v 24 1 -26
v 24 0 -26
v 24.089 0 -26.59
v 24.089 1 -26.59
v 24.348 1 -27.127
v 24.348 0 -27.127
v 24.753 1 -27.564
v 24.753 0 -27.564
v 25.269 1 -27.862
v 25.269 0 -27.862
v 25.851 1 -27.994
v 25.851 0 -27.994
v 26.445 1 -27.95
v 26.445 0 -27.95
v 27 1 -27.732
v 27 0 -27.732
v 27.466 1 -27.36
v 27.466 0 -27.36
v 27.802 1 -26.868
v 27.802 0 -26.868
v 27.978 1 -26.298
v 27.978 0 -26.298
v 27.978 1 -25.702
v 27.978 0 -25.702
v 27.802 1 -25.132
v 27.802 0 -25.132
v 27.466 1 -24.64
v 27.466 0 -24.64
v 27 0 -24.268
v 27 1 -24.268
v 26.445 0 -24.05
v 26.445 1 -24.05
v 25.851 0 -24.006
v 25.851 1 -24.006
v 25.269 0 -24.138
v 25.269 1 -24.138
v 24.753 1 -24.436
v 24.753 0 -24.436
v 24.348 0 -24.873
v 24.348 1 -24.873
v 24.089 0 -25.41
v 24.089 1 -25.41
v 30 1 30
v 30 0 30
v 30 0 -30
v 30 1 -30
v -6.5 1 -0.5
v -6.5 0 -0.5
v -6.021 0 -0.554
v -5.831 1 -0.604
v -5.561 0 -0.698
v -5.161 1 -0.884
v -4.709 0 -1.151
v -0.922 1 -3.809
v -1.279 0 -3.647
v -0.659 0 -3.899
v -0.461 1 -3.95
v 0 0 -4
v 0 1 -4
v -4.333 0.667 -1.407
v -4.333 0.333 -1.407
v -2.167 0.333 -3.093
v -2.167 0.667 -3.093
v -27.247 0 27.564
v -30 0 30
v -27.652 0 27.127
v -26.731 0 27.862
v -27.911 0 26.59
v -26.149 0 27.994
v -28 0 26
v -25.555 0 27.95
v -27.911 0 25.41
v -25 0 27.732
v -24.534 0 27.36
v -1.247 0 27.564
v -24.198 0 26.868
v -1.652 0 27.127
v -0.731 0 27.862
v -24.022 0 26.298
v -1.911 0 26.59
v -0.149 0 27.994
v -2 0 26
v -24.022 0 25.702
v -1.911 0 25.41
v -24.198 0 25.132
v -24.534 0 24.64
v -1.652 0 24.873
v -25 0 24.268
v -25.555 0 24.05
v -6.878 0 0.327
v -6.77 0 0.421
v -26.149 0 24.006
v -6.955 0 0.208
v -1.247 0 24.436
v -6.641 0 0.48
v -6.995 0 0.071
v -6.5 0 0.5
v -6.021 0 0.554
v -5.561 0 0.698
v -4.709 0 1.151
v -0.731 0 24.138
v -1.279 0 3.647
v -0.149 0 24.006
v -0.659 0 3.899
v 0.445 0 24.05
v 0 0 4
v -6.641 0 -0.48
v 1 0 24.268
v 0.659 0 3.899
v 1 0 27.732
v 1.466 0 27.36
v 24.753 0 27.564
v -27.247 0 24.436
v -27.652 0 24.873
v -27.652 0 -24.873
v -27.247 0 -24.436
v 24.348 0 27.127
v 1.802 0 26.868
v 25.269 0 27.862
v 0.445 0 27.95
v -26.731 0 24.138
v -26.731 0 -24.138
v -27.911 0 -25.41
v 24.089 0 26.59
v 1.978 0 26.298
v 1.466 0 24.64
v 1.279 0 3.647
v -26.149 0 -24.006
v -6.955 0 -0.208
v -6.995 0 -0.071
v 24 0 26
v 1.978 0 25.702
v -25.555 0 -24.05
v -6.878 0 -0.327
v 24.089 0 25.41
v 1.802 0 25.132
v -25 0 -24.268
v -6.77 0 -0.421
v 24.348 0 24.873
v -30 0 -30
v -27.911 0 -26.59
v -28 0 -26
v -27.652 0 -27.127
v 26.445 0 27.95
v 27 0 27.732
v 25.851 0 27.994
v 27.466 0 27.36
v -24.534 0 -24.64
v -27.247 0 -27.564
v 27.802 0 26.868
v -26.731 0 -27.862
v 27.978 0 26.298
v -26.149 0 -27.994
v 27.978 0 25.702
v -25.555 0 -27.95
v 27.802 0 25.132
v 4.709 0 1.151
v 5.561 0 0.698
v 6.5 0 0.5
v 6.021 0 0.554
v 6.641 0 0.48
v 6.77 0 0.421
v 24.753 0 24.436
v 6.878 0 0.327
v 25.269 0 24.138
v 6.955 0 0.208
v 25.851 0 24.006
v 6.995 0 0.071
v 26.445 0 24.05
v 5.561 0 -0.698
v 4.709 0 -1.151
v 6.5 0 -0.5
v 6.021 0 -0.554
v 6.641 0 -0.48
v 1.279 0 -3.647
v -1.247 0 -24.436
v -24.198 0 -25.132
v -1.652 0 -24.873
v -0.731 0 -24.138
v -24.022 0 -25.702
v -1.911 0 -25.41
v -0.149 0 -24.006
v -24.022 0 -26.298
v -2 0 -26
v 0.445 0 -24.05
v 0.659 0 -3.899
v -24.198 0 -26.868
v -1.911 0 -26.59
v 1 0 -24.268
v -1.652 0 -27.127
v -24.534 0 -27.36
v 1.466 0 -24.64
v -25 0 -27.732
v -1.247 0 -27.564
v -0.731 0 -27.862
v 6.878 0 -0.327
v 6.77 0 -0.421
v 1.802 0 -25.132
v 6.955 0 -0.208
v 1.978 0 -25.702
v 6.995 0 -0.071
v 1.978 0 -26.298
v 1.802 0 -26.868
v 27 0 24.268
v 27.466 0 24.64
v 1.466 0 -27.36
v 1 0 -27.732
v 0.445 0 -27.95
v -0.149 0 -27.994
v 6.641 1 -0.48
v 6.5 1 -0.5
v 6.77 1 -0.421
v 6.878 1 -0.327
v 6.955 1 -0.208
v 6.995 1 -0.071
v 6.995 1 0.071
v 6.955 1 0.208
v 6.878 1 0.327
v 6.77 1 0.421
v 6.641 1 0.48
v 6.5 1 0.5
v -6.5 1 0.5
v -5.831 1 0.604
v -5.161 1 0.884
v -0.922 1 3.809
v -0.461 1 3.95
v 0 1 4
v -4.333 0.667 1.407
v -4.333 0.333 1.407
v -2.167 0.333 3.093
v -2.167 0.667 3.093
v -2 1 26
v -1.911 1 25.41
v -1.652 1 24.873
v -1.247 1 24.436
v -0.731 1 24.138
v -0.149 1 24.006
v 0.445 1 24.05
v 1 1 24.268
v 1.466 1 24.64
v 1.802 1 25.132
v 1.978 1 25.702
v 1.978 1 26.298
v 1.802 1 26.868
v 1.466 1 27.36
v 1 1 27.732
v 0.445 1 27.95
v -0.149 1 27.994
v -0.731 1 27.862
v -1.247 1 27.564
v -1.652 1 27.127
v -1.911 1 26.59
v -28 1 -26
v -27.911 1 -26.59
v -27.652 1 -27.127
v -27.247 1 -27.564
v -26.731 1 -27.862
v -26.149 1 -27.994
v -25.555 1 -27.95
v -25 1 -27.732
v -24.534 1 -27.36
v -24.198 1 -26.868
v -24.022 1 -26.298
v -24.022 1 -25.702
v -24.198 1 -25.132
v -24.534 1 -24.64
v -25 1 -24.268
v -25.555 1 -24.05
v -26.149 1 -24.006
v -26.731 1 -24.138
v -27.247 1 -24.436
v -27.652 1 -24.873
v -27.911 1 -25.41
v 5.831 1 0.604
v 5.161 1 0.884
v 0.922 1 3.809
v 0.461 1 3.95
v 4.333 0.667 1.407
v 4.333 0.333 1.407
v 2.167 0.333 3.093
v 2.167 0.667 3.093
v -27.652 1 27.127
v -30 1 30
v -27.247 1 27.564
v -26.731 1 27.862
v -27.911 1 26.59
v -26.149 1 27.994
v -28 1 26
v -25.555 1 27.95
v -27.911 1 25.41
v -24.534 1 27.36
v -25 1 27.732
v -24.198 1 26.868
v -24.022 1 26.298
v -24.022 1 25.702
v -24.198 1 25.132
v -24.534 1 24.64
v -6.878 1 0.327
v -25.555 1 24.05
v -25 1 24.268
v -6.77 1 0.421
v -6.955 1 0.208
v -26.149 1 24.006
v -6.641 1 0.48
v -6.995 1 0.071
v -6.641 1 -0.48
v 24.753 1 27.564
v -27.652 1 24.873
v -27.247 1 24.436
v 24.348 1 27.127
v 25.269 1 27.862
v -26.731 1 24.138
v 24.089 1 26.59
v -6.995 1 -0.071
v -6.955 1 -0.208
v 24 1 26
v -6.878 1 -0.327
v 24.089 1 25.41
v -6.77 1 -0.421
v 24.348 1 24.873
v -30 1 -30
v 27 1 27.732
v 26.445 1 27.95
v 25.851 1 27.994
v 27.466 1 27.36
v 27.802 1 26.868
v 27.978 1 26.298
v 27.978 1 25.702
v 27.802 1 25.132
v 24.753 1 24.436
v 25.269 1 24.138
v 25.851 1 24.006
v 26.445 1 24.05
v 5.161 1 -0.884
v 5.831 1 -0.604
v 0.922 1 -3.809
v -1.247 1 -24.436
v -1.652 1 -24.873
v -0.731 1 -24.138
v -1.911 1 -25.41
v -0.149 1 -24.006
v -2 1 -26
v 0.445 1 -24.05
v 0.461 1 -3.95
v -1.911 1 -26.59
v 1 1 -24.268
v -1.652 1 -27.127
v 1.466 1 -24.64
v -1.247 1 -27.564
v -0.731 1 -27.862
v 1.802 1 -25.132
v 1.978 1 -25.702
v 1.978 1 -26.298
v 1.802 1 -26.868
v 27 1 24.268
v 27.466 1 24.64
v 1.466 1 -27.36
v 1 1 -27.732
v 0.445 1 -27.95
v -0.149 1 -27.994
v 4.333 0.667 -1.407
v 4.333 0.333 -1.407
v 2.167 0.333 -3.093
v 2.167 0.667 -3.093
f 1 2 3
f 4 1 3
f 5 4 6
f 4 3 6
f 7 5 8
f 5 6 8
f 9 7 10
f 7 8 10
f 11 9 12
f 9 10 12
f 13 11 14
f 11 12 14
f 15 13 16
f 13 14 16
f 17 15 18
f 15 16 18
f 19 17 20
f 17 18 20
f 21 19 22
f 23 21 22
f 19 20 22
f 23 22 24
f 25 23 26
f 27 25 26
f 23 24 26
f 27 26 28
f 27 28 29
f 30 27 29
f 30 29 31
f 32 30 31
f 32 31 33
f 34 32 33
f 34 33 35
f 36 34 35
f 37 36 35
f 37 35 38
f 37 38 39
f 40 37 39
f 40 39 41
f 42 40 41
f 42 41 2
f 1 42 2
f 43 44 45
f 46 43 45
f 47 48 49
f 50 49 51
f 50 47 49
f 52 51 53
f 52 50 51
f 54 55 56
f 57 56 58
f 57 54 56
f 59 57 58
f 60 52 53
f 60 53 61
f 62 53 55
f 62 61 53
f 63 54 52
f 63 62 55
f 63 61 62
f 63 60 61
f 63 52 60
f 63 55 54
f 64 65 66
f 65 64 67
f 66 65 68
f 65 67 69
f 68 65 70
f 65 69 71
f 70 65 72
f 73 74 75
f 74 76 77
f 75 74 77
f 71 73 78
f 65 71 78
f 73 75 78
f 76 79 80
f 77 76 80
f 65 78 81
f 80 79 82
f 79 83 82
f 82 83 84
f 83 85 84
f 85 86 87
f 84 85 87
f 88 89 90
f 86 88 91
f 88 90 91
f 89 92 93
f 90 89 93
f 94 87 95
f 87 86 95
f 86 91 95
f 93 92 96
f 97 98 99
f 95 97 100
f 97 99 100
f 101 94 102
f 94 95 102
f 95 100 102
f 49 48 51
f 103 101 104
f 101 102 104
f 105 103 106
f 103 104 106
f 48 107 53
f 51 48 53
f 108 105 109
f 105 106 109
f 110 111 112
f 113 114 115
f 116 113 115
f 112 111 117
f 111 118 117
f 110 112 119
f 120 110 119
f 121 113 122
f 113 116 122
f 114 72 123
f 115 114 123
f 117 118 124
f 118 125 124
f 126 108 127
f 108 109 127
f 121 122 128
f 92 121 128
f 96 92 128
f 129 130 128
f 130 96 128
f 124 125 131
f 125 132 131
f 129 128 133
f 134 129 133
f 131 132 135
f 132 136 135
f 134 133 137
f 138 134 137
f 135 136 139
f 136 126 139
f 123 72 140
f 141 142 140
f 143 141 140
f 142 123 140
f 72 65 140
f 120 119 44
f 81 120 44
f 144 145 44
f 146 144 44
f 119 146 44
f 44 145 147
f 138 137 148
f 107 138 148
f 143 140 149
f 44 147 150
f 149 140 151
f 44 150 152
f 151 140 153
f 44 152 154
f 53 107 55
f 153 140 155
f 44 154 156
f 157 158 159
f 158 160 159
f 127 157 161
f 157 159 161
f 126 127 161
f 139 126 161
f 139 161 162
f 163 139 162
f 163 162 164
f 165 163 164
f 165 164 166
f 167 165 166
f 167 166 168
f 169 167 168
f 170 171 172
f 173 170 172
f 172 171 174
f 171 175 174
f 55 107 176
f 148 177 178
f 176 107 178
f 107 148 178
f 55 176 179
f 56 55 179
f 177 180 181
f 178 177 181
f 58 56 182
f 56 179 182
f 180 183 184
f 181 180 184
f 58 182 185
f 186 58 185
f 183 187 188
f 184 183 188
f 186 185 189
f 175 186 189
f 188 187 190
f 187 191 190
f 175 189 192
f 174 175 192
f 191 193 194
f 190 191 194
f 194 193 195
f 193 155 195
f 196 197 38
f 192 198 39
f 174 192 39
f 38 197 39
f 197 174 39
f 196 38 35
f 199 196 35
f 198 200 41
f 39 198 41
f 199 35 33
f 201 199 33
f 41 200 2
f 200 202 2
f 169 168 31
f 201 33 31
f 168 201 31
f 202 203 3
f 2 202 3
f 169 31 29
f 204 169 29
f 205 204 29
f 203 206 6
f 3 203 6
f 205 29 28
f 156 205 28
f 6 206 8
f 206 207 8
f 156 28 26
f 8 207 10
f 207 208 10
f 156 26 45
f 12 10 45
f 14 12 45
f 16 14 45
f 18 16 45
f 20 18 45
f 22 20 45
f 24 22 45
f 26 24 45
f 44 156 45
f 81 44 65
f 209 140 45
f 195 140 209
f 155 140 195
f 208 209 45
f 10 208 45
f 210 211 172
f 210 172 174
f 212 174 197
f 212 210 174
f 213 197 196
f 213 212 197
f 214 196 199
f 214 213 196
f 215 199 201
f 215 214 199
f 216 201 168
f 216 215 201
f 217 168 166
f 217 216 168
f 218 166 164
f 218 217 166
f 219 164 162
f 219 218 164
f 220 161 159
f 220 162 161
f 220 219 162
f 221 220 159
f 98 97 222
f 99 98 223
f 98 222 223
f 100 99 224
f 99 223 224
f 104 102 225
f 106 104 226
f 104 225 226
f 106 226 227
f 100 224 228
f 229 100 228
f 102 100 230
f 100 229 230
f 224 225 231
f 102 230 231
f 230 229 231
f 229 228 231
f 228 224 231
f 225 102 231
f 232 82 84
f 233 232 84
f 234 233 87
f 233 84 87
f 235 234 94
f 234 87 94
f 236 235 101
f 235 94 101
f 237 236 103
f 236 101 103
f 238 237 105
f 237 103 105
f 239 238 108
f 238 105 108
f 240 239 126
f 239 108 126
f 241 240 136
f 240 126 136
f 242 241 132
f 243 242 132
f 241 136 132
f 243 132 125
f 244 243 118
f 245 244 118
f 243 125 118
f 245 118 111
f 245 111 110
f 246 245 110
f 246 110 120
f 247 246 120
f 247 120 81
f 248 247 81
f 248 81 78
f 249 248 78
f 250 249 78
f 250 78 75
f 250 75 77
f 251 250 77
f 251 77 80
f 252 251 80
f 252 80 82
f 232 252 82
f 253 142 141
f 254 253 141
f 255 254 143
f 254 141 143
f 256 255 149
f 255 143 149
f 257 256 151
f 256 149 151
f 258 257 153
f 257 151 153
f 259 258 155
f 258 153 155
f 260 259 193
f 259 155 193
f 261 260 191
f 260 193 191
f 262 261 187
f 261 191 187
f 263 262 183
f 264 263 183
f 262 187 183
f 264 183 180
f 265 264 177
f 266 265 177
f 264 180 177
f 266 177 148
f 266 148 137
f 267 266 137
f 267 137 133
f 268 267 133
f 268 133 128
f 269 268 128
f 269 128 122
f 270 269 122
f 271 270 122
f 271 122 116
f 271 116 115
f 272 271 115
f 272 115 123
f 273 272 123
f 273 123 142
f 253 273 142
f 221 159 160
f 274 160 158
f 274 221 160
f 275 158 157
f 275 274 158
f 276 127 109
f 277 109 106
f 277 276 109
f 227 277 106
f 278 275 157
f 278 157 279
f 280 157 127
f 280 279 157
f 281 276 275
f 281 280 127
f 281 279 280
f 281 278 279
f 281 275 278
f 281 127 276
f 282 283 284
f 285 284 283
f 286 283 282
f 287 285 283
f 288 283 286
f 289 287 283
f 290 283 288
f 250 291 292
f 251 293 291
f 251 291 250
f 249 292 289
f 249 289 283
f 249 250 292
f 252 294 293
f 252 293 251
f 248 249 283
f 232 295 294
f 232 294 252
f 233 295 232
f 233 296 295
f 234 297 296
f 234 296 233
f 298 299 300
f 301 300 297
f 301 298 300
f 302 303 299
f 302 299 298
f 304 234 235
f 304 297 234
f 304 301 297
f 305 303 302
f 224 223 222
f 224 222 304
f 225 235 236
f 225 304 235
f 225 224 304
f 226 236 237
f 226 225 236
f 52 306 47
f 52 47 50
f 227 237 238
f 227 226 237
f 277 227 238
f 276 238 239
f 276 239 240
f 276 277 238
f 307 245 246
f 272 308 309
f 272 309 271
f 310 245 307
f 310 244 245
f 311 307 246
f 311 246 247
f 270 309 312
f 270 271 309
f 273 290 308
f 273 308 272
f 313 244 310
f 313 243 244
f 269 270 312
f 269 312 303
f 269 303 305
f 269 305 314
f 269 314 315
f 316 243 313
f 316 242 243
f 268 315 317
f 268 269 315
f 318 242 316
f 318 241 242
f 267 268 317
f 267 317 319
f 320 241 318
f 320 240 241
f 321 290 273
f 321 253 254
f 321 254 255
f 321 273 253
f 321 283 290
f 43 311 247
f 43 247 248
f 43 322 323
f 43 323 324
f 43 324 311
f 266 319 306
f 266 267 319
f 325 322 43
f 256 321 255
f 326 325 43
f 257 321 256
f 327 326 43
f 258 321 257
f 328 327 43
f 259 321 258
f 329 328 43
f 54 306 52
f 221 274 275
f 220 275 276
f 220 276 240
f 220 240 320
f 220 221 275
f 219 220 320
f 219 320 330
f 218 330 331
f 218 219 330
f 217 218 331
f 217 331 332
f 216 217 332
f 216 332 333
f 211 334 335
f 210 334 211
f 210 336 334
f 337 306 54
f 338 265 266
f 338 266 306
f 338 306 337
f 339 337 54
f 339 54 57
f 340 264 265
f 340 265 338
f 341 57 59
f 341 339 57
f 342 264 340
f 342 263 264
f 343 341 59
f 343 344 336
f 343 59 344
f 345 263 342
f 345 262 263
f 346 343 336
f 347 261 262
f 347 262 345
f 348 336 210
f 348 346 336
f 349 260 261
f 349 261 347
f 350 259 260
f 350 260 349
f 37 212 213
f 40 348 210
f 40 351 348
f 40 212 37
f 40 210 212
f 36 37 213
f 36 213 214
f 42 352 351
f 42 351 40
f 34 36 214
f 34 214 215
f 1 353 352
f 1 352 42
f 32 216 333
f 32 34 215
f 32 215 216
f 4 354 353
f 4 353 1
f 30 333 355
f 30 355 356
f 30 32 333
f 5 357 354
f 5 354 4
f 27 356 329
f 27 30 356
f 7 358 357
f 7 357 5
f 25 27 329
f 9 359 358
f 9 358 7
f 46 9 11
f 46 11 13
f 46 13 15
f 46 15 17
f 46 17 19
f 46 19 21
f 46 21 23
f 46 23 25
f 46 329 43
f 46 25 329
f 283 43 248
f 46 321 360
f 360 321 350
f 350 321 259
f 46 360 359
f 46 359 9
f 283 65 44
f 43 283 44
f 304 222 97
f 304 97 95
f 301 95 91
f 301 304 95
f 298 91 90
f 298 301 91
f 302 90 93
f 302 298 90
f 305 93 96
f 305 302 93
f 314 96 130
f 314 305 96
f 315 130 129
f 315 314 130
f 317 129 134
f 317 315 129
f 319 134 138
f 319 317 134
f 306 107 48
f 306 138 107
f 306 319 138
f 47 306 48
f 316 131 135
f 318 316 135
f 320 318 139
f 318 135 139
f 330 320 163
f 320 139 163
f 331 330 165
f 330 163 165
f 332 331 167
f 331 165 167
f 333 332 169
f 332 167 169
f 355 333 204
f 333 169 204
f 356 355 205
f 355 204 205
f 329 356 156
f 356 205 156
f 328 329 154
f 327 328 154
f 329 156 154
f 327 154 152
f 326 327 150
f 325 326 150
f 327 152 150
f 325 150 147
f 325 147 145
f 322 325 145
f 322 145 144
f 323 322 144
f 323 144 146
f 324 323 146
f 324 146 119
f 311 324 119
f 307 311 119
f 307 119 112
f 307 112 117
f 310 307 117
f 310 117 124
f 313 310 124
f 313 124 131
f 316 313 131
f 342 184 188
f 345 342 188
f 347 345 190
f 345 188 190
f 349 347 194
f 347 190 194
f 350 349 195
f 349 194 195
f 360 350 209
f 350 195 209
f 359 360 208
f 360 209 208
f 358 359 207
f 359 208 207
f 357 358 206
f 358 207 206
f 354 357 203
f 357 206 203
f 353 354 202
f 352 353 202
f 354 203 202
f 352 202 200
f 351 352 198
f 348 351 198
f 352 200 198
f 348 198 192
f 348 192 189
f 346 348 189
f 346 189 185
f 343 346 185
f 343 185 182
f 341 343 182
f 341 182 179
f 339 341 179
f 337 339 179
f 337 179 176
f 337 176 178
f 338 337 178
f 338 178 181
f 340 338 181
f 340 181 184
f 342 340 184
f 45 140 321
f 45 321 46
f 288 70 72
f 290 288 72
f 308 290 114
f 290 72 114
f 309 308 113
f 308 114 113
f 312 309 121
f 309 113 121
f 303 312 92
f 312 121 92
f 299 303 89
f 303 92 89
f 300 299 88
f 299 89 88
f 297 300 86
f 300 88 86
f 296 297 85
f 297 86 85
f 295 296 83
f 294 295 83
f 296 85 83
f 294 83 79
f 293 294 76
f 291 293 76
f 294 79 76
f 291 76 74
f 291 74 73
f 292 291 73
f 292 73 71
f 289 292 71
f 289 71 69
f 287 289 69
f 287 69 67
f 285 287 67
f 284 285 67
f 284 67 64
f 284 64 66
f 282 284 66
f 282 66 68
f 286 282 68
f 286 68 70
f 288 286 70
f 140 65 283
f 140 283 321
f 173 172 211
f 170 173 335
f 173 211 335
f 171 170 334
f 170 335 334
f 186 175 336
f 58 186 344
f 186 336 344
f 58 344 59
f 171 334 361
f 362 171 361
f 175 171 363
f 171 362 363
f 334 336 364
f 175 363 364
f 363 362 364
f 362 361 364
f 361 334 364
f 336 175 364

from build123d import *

# Parameters (mm, degrees)
SKETCH1_W                = 60
SKETCH1_H                = 60
BOSS_EXTRUDE1_DEPTH      = 1
F_4_0_4_DIAMETER_HOLE1_D = 4
ICELL_DEPTH              = 10


with BuildPart() as part:
    # Sketch1 → Boss-Extrude1 (new body)
    with BuildSketch(Plane(origin=(0, 0, 0), x_dir=(1, 0, 0), z_dir=(0, 1, 0))):
        Rectangle(SKETCH1_W, SKETCH1_H)
    extrude(amount=BOSS_EXTRUDE1_DEPTH)

    # Ø4.0 (4) Diameter Hole1 (through all)
    with Locations(Plane(origin=(0, 1, 0), x_dir=(1, 0, 0), z_dir=(0, 1, 0))):
        with Locations((26, 26), (0, 26), (-26, 26), (0, -26), (26, -26), (-26, -26)):
            Hole(F_4_0_4_DIAMETER_HOLE1_D / 2)

    # Sketch19 → iCell (cut)
    with BuildSketch(Plane(origin=(0, 1, 0), x_dir=(1, 0, 0), z_dir=(0, 1, 0))):
        with BuildLine():
            ThreePointArc((-6.5, -0.5), (-7, 0), (-6.5, 0.5))
            add(Edge.make_bspline(
                [(-6.5, 0.5), (-4.333333334, 0.5), (-2.166666667, 4.000004082), (-1e-09, 4.000013237)],
                knots=[0.083333333, 0.083333333, 0.083333333, 0.083333333, 0.916666667, 0.916666667, 0.916666667, 0.916666667], degree=3))
            add(Edge.make_bspline(
                [(6.499999999, 0.5), (4.333333333, 0.5), (2.166666666, 4.000004083), (-1e-09, 4.000013237)],
                knots=[0.083333333, 0.083333333, 0.083333333, 0.083333333, 0.916666667, 0.916666667, 0.916666667, 0.916666667], degree=3))
            ThreePointArc((6.499999999, 0.5), (6.999999999, 0), (6.499999999, -0.5))
            add(Edge.make_bspline(
                [(6.499999999, -0.5), (4.333333333, -0.5), (2.166666666, -4.000004083), (0, -4.000013237)],
                knots=[0.083333333, 0.083333333, 0.083333333, 0.083333333, 0.916666667, 0.916666667, 0.916666667, 0.916666667], degree=3))
            add(Edge.make_bspline(
                [(-6.5, -0.5), (-4.333333334, -0.5), (-2.166666667, -4.000004083), (0, -4.000013237)],
                knots=[0.083333333, 0.083333333, 0.083333333, 0.083333333, 0.916666667, 0.916666667, 0.916666667, 0.916666667], degree=3))
        make_face()
    extrude(amount=-ICELL_DEPTH, mode=Mode.SUBTRACT)


solid = part.part
